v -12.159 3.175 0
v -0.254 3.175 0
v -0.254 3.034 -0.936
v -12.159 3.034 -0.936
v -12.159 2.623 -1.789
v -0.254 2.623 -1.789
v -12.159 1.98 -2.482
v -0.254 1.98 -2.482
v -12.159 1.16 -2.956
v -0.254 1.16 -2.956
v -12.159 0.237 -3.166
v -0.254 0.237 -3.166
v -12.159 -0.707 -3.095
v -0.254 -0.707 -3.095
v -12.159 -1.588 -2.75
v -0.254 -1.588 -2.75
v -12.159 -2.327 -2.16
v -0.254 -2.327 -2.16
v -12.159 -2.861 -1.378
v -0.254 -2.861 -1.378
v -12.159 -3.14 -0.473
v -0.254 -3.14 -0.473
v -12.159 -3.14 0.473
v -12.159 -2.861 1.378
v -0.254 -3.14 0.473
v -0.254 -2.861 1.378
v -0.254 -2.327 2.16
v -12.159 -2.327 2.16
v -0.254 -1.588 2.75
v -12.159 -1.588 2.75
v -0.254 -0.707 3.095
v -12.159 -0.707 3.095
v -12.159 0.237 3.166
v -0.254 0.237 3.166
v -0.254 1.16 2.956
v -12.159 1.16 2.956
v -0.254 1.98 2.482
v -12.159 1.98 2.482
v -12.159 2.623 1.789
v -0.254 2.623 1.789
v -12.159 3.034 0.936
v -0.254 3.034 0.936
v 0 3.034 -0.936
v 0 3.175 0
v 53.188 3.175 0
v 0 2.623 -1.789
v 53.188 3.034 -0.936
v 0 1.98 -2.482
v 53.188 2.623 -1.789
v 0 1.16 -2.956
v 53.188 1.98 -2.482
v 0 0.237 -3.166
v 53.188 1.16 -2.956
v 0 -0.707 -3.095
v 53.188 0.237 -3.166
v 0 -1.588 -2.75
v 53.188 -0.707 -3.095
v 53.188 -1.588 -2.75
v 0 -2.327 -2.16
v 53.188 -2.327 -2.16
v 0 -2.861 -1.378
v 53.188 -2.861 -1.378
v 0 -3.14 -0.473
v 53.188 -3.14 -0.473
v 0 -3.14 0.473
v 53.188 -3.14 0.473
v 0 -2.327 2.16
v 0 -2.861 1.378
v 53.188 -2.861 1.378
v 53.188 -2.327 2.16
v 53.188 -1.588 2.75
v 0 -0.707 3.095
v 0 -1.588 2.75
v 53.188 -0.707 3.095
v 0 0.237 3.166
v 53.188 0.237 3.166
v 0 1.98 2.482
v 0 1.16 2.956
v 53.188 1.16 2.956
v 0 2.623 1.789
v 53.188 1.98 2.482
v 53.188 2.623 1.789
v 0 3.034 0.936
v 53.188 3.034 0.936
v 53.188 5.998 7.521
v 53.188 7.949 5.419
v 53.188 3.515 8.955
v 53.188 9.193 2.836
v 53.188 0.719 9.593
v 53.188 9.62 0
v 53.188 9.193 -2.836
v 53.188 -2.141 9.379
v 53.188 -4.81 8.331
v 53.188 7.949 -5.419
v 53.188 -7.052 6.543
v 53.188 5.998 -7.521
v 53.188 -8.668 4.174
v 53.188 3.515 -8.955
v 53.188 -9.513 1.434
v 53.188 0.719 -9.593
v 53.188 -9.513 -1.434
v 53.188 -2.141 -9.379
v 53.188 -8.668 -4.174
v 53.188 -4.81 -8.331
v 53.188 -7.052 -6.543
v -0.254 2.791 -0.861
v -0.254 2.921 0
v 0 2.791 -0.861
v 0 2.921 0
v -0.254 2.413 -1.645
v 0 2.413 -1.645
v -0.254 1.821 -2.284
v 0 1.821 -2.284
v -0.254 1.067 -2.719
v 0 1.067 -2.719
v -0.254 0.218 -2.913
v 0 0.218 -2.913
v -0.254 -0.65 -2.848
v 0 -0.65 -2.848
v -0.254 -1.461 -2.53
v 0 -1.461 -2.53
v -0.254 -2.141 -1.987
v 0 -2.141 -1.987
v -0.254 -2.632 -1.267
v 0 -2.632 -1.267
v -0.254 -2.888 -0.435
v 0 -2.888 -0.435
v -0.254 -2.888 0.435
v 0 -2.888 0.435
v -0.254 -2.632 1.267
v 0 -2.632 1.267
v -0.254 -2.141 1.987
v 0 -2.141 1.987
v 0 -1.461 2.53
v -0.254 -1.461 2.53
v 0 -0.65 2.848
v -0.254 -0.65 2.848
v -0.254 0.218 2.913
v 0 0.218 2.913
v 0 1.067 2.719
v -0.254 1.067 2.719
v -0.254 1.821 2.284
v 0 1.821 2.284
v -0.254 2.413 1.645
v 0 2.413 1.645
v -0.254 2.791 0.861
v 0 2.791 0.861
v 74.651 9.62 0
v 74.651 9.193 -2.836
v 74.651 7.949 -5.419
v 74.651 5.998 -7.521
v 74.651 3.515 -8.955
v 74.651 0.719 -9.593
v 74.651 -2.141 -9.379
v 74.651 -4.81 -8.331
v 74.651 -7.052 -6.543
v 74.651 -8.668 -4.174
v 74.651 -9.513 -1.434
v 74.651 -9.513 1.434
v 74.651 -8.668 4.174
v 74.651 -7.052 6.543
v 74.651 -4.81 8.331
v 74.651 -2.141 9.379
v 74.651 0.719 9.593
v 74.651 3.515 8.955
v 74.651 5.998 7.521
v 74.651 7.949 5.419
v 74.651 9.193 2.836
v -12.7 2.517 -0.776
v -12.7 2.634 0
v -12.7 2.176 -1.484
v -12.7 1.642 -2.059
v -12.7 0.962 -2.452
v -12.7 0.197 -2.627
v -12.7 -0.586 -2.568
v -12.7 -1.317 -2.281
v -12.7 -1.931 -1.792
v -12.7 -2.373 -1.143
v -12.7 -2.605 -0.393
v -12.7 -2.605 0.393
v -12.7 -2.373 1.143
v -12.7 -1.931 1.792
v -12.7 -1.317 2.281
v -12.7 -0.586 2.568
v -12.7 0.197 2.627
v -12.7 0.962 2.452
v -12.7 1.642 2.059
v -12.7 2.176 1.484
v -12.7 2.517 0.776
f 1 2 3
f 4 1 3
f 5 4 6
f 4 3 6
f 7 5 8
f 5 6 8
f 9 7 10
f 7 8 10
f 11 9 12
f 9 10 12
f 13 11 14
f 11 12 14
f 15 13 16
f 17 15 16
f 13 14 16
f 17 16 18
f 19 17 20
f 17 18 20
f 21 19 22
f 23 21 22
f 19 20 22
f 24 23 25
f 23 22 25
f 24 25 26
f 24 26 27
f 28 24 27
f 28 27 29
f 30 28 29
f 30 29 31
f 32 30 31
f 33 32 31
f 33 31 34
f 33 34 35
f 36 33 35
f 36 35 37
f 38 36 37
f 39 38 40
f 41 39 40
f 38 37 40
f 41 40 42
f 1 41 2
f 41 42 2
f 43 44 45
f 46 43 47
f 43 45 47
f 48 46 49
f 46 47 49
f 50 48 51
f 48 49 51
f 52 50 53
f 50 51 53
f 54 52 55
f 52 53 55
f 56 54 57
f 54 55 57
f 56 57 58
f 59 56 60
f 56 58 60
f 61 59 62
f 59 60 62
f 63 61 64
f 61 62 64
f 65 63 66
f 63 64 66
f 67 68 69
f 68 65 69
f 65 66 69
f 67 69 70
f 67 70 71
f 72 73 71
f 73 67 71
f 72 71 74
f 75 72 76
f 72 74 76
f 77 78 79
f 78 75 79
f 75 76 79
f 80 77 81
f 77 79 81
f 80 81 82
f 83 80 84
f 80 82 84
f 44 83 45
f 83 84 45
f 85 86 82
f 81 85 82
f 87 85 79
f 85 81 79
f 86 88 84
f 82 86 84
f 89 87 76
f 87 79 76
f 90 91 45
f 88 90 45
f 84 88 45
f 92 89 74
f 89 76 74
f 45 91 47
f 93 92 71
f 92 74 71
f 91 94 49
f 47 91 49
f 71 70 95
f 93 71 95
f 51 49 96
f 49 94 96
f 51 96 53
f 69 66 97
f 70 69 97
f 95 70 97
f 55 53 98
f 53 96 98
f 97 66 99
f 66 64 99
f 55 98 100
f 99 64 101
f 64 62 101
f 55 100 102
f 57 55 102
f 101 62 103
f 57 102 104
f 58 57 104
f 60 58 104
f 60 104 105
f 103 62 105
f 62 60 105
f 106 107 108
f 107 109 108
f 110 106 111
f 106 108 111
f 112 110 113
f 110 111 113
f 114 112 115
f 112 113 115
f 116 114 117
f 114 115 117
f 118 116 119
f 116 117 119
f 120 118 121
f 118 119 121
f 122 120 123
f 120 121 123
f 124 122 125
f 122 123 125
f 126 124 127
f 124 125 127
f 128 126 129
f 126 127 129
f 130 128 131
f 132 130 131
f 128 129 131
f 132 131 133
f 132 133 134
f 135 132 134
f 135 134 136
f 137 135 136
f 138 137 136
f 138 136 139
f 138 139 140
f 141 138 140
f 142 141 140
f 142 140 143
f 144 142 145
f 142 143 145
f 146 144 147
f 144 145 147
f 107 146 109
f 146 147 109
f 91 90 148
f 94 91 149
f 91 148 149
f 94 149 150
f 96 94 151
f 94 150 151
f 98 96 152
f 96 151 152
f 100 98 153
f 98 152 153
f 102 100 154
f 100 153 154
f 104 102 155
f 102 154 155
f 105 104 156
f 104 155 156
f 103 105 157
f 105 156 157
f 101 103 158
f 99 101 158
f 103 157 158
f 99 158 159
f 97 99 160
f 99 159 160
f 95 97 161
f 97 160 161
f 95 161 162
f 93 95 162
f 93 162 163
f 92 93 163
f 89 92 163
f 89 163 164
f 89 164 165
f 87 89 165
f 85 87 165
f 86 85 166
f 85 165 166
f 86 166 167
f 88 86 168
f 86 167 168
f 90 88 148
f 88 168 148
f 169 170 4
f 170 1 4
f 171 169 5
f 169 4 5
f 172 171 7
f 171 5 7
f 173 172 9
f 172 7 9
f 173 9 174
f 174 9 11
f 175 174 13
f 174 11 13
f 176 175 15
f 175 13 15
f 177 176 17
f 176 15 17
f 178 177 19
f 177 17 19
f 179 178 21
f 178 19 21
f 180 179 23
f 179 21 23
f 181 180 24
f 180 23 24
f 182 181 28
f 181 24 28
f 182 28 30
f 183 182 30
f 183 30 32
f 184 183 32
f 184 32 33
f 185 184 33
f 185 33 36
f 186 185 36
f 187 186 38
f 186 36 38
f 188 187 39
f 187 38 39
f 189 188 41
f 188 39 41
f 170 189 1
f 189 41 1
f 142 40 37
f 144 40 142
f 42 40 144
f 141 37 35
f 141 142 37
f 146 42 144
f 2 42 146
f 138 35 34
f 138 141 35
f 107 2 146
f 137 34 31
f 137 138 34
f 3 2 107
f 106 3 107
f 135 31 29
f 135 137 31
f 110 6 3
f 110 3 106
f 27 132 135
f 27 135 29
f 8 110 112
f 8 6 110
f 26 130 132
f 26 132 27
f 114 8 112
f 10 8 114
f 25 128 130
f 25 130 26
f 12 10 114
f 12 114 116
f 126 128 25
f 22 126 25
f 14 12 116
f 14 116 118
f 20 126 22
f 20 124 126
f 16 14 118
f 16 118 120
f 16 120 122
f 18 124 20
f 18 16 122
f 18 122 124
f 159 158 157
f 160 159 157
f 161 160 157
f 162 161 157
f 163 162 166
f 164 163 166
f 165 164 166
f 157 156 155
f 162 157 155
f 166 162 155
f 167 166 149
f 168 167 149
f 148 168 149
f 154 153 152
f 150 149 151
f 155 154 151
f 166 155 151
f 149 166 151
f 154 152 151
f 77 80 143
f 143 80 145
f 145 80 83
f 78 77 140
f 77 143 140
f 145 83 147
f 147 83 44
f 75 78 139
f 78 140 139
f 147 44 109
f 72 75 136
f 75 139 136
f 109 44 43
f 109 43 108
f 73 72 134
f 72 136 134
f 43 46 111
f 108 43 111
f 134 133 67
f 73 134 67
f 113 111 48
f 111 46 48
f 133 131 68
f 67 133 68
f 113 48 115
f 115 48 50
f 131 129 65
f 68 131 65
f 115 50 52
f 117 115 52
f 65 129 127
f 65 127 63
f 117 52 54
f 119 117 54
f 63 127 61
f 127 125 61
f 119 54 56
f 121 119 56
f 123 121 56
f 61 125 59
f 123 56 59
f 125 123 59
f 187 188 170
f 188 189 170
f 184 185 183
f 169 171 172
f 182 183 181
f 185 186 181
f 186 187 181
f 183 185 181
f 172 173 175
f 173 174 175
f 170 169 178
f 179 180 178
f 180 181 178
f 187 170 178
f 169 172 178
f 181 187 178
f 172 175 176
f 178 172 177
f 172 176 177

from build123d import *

# Parameters (mm, degrees)
SKETCH3_W = 0.254
SKETCH3_H = 0.508


with BuildPart() as part:
    # Sketch1 → Revolve1 (revolve)
    with BuildSketch(Plane.XY):
        Polygon((0, 0), (0, 3.175), (53.1876, 3.175), (53.1876, 9.62025), (74.6506, 9.62025), (74.6506, 0), align=None)
    revolve(axis=Axis((74.6506, 0, 0), (-1, 0, 0)))

    # Sketch2 → Revolve2 (revolve)
    with BuildSketch(Plane.XY):
        Polygon((-12.7, 0), (-12.7, 2.63398), (-12.15898, 3.175), (0, 3.175), (0, 0), align=None)
    revolve(axis=Axis((0, 0, 0), (-1, 0, 0)))

    # Sketch3 → Cut-Revolve1 (revolve, cut)
    with BuildSketch(Plane.XY):
        with Locations((-0.127, 3.175)):
            Rectangle(SKETCH3_W, SKETCH3_H)
    revolve(axis=Axis((0, 0, 0), (-1, 0, 0)), mode=Mode.SUBTRACT)


solid = part.part
